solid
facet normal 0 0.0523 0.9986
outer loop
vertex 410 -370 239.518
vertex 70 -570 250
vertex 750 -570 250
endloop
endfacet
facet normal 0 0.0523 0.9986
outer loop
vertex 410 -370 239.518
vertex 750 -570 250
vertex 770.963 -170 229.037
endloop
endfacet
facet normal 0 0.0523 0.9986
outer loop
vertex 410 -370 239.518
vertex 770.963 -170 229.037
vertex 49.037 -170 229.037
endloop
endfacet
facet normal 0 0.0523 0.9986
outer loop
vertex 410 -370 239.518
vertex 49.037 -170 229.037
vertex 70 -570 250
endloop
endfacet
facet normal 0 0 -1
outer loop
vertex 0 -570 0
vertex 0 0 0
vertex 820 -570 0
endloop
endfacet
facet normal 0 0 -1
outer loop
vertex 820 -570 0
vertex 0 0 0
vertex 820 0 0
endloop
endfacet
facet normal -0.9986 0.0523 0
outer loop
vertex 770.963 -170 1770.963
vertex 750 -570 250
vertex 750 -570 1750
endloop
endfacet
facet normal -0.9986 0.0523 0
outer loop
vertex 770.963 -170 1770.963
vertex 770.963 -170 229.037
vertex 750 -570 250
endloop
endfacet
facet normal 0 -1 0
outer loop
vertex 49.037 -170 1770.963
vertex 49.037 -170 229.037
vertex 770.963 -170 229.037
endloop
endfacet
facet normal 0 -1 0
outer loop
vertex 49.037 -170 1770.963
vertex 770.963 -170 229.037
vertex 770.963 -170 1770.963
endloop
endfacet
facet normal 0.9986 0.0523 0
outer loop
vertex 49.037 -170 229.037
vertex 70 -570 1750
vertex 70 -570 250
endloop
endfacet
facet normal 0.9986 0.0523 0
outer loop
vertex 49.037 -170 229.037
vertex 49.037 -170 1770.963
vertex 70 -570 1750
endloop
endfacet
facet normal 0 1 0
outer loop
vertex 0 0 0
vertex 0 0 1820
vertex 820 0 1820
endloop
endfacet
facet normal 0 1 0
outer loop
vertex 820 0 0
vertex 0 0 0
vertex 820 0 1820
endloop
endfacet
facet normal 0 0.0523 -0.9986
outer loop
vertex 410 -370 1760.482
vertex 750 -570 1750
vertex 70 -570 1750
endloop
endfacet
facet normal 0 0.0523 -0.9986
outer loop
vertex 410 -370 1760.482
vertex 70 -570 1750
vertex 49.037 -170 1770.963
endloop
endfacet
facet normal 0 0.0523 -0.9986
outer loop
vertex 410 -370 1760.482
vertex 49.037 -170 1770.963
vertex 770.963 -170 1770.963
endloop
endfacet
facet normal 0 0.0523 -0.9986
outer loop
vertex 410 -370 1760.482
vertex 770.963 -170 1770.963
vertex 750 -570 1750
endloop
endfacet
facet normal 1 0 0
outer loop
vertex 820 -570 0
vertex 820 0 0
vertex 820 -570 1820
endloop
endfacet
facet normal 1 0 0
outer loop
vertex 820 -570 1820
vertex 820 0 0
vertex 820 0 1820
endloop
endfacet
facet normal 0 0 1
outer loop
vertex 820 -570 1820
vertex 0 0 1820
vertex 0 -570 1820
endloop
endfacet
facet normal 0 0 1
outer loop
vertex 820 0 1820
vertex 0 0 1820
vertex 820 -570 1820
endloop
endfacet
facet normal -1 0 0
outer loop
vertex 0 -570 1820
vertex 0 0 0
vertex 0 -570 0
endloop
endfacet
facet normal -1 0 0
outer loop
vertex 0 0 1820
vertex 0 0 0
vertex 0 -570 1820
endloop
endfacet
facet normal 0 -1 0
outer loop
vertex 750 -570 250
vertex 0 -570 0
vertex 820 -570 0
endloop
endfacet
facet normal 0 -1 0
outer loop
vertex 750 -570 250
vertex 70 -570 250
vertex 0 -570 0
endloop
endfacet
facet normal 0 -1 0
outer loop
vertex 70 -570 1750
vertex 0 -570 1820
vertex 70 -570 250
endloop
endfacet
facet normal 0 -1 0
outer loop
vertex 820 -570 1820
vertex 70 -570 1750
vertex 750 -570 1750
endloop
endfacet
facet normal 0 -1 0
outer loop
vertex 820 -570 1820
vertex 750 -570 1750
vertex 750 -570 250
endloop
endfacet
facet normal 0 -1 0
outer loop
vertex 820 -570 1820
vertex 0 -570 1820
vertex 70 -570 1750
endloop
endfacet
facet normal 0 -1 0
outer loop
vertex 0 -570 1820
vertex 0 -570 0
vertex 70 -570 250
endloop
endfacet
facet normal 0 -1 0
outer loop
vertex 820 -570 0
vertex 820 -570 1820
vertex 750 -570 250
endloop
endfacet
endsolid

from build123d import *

# Parameters (mm, degrees)
F0_W     = 820
F0_H     = 1820
F1_DEPTH = 570
F2_W     = 680
F2_H     = 1500
F3_DEPTH = 400
F3_TAPER = -3


with BuildPart() as f1:
    # F0 (on Front) → F1 (new body)
    with BuildSketch(Plane.XZ):
        with Locations((410, 910)):
            Rectangle(F0_W, F0_H)
    extrude(amount=F1_DEPTH)

    # F2 (on face) → F3 (cut)
    with BuildSketch(Plane.XZ.offset(570)):
        with Locations((410, 1000)):
            Rectangle(F2_W, F2_H)
    extrude(amount=-F3_DEPTH, taper=F3_TAPER, mode=Mode.SUBTRACT)


solid = f1.part
